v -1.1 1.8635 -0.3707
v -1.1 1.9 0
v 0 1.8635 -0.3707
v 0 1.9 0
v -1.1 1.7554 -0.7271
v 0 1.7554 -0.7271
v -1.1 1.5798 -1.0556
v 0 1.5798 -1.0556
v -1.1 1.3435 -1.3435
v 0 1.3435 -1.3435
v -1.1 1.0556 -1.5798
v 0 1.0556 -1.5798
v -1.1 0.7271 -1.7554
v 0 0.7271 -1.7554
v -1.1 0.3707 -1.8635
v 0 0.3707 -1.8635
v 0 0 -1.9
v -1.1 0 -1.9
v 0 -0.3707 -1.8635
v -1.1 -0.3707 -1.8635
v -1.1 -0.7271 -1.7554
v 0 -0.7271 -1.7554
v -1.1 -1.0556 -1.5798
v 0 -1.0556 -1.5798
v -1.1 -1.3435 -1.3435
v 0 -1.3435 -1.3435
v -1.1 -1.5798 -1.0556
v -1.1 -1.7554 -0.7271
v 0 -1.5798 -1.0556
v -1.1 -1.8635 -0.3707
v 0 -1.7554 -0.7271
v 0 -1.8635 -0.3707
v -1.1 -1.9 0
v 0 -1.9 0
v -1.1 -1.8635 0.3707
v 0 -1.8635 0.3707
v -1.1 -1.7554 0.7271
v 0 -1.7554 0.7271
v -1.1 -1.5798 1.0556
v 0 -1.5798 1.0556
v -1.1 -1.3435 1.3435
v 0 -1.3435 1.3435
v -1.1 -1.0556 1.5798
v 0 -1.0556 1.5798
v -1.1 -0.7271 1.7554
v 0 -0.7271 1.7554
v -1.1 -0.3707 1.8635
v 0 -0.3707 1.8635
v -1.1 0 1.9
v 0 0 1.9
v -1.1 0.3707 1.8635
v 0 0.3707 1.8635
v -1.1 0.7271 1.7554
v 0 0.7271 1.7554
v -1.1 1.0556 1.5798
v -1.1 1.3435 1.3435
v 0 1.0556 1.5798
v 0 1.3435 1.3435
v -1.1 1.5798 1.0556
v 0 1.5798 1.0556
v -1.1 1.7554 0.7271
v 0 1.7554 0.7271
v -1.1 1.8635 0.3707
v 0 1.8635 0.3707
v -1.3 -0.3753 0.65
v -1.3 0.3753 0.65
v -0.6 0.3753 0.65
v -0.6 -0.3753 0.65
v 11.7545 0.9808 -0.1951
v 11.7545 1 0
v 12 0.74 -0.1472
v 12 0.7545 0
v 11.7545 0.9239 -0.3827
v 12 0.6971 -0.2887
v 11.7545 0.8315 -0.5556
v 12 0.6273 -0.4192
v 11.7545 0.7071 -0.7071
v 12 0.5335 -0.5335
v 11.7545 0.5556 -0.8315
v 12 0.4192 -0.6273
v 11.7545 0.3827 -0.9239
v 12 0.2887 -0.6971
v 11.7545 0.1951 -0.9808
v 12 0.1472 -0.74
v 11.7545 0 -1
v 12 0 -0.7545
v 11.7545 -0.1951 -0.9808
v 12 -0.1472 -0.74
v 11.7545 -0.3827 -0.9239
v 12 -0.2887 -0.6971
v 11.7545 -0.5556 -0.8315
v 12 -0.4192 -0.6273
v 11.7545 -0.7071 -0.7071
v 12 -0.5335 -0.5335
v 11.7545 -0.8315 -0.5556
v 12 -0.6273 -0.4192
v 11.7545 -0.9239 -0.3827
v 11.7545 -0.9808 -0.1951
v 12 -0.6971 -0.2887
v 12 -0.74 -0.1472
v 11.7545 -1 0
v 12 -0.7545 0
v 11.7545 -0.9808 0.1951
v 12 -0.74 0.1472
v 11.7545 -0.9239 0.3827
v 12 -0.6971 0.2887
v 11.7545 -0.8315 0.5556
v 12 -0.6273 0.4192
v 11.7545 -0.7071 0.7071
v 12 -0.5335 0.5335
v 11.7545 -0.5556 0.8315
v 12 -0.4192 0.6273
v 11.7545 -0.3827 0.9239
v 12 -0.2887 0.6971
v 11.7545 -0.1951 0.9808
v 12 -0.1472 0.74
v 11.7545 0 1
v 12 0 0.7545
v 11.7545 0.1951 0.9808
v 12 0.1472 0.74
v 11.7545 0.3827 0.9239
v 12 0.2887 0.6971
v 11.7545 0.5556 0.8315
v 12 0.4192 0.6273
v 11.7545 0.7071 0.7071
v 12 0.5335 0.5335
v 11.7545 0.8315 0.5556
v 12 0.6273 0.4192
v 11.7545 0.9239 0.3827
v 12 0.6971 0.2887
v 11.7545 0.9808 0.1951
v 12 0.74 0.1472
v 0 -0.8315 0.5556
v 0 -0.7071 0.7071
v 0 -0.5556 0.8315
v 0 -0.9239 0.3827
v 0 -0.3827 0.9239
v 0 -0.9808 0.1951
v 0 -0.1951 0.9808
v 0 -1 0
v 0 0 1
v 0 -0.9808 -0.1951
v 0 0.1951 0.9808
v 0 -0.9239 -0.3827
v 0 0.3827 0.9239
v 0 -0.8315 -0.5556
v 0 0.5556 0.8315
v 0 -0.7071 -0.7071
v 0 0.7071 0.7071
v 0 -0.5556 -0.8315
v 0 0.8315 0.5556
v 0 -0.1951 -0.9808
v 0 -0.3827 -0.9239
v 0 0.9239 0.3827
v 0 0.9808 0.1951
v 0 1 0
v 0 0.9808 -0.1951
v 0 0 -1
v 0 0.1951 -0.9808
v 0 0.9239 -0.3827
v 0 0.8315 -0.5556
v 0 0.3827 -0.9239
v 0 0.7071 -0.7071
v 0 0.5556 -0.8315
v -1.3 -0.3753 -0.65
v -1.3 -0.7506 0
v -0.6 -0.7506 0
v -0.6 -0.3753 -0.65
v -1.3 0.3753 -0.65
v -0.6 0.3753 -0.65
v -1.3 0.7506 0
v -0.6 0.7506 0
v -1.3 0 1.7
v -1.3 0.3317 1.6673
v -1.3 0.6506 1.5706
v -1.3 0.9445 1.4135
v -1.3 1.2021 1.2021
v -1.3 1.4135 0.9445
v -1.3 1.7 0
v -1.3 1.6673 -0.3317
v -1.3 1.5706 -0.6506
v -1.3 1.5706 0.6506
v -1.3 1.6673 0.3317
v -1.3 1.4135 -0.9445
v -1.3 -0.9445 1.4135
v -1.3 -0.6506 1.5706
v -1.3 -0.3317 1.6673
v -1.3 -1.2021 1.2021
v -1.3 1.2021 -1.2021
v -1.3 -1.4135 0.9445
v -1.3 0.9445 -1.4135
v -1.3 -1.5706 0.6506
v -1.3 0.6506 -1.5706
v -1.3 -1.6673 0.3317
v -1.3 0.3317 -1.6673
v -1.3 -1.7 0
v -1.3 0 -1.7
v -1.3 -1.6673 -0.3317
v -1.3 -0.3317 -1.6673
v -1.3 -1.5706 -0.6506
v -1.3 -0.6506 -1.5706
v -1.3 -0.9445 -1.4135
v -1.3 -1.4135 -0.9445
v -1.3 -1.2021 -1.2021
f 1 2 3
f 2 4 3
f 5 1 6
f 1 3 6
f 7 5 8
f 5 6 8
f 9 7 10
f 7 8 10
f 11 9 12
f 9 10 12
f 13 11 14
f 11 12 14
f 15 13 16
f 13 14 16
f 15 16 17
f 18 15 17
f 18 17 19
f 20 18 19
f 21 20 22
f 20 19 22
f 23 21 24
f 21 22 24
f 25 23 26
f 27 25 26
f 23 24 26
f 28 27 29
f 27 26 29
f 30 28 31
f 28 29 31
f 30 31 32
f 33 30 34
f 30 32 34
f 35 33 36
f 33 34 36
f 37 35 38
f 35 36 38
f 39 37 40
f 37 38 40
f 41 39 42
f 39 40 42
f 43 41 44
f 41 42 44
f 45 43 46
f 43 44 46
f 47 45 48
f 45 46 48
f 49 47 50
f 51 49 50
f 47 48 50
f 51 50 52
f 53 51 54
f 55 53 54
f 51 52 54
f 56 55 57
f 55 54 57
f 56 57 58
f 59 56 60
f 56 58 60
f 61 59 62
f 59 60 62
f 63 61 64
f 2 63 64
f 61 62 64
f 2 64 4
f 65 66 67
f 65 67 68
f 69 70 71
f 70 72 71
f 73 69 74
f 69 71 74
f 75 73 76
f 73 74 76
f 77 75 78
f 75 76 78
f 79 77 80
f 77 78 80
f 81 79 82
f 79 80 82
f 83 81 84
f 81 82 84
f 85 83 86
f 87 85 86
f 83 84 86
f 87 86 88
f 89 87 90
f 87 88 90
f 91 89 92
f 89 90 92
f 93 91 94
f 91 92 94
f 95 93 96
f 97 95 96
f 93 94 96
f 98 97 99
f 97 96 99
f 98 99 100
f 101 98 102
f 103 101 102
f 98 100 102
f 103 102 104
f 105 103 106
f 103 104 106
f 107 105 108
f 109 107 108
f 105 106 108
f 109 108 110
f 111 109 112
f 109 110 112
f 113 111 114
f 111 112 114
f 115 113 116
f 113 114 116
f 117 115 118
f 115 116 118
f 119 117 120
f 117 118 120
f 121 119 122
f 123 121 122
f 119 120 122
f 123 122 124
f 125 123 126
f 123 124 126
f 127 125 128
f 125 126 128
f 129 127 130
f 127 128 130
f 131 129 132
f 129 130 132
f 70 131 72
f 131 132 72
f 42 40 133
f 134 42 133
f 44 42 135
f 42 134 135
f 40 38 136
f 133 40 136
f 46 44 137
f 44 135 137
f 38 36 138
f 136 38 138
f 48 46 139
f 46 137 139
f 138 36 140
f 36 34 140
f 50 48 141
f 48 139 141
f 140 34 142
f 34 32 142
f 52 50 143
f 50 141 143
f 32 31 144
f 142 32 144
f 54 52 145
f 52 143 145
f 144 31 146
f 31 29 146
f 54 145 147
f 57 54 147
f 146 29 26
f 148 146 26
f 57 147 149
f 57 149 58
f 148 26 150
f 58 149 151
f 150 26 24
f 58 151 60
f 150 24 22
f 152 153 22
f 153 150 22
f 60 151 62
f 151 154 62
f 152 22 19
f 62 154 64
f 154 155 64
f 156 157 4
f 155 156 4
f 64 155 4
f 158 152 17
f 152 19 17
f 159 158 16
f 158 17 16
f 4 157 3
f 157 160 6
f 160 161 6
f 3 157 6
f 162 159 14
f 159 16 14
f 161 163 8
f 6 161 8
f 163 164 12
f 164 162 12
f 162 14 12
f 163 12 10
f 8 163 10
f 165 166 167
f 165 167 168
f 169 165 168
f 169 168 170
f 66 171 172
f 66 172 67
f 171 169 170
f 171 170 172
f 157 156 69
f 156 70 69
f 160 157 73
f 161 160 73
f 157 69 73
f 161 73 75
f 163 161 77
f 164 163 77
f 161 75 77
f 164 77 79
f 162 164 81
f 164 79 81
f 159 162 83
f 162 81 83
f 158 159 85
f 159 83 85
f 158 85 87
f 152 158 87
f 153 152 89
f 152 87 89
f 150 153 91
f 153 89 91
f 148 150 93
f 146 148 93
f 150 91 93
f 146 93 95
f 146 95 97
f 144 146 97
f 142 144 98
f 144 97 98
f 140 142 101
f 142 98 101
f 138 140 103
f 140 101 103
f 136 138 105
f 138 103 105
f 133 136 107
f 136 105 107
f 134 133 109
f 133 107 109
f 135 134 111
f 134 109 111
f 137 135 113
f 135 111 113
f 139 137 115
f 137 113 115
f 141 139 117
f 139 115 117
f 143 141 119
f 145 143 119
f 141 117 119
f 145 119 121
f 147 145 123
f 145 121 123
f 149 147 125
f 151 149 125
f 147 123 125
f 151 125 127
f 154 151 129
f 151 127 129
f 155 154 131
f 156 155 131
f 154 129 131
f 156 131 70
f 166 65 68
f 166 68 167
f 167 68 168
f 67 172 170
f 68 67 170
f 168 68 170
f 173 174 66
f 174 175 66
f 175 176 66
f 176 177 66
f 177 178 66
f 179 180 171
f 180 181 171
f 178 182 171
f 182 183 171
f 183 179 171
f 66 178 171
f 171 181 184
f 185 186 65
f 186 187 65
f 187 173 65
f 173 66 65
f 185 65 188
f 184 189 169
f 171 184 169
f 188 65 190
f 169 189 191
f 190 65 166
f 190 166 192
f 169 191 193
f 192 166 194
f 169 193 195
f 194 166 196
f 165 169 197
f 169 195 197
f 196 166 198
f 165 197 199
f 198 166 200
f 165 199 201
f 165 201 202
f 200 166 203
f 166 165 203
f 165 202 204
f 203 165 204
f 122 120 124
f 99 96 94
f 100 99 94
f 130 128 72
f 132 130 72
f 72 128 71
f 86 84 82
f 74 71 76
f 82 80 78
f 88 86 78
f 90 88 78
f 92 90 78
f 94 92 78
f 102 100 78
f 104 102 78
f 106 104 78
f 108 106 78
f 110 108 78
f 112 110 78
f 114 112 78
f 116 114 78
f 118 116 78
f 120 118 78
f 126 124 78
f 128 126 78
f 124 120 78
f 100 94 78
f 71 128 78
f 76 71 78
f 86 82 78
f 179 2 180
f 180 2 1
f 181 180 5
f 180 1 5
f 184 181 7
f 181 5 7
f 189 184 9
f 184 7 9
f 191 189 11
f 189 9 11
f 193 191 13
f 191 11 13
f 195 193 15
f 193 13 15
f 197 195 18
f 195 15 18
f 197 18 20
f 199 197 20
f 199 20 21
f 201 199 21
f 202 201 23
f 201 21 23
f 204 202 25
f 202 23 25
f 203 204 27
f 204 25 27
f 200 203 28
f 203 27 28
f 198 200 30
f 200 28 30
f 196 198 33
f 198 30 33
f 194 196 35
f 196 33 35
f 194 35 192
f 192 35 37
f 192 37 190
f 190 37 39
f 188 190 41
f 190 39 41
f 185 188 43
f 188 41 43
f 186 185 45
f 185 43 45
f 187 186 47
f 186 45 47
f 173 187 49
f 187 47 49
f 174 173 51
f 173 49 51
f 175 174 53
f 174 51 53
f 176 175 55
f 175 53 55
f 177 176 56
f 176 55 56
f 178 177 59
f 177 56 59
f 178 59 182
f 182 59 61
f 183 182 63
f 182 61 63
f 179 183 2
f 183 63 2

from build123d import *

# Parameters (mm, degrees)
CUT_EXTRUDE1_DEPTH = 0.7


with BuildPart() as part:
    # Sketch1 → Revolve1 (revolve)
    with BuildSketch(Plane.XY):
        Polygon((-1.3, 0), (-1.3, 1.7), (-1.1, 1.9), (0, 1.9), (0, 1), (11.7545, 1), (12, 0.7545), (12, 0), align=None)
    revolve(axis=Axis((12, 0, 0), (-1, 0, 0)))

    # Sketch2 → Cut-Extrude1 (cut)
    with BuildSketch(Plane(origin=(-1.3, 0, 0), x_dir=(0, 0, -1), z_dir=(1, 0, 0))):
        Polygon((-0.65, -0.375277675), (0, -0.75055535), (0.65, -0.375277675), (0.65, 0.375277675), (0, 0.75055535), (-0.65, 0.375277675), align=None)
    extrude(amount=CUT_EXTRUDE1_DEPTH, mode=Mode.SUBTRACT)


solid = part.part
